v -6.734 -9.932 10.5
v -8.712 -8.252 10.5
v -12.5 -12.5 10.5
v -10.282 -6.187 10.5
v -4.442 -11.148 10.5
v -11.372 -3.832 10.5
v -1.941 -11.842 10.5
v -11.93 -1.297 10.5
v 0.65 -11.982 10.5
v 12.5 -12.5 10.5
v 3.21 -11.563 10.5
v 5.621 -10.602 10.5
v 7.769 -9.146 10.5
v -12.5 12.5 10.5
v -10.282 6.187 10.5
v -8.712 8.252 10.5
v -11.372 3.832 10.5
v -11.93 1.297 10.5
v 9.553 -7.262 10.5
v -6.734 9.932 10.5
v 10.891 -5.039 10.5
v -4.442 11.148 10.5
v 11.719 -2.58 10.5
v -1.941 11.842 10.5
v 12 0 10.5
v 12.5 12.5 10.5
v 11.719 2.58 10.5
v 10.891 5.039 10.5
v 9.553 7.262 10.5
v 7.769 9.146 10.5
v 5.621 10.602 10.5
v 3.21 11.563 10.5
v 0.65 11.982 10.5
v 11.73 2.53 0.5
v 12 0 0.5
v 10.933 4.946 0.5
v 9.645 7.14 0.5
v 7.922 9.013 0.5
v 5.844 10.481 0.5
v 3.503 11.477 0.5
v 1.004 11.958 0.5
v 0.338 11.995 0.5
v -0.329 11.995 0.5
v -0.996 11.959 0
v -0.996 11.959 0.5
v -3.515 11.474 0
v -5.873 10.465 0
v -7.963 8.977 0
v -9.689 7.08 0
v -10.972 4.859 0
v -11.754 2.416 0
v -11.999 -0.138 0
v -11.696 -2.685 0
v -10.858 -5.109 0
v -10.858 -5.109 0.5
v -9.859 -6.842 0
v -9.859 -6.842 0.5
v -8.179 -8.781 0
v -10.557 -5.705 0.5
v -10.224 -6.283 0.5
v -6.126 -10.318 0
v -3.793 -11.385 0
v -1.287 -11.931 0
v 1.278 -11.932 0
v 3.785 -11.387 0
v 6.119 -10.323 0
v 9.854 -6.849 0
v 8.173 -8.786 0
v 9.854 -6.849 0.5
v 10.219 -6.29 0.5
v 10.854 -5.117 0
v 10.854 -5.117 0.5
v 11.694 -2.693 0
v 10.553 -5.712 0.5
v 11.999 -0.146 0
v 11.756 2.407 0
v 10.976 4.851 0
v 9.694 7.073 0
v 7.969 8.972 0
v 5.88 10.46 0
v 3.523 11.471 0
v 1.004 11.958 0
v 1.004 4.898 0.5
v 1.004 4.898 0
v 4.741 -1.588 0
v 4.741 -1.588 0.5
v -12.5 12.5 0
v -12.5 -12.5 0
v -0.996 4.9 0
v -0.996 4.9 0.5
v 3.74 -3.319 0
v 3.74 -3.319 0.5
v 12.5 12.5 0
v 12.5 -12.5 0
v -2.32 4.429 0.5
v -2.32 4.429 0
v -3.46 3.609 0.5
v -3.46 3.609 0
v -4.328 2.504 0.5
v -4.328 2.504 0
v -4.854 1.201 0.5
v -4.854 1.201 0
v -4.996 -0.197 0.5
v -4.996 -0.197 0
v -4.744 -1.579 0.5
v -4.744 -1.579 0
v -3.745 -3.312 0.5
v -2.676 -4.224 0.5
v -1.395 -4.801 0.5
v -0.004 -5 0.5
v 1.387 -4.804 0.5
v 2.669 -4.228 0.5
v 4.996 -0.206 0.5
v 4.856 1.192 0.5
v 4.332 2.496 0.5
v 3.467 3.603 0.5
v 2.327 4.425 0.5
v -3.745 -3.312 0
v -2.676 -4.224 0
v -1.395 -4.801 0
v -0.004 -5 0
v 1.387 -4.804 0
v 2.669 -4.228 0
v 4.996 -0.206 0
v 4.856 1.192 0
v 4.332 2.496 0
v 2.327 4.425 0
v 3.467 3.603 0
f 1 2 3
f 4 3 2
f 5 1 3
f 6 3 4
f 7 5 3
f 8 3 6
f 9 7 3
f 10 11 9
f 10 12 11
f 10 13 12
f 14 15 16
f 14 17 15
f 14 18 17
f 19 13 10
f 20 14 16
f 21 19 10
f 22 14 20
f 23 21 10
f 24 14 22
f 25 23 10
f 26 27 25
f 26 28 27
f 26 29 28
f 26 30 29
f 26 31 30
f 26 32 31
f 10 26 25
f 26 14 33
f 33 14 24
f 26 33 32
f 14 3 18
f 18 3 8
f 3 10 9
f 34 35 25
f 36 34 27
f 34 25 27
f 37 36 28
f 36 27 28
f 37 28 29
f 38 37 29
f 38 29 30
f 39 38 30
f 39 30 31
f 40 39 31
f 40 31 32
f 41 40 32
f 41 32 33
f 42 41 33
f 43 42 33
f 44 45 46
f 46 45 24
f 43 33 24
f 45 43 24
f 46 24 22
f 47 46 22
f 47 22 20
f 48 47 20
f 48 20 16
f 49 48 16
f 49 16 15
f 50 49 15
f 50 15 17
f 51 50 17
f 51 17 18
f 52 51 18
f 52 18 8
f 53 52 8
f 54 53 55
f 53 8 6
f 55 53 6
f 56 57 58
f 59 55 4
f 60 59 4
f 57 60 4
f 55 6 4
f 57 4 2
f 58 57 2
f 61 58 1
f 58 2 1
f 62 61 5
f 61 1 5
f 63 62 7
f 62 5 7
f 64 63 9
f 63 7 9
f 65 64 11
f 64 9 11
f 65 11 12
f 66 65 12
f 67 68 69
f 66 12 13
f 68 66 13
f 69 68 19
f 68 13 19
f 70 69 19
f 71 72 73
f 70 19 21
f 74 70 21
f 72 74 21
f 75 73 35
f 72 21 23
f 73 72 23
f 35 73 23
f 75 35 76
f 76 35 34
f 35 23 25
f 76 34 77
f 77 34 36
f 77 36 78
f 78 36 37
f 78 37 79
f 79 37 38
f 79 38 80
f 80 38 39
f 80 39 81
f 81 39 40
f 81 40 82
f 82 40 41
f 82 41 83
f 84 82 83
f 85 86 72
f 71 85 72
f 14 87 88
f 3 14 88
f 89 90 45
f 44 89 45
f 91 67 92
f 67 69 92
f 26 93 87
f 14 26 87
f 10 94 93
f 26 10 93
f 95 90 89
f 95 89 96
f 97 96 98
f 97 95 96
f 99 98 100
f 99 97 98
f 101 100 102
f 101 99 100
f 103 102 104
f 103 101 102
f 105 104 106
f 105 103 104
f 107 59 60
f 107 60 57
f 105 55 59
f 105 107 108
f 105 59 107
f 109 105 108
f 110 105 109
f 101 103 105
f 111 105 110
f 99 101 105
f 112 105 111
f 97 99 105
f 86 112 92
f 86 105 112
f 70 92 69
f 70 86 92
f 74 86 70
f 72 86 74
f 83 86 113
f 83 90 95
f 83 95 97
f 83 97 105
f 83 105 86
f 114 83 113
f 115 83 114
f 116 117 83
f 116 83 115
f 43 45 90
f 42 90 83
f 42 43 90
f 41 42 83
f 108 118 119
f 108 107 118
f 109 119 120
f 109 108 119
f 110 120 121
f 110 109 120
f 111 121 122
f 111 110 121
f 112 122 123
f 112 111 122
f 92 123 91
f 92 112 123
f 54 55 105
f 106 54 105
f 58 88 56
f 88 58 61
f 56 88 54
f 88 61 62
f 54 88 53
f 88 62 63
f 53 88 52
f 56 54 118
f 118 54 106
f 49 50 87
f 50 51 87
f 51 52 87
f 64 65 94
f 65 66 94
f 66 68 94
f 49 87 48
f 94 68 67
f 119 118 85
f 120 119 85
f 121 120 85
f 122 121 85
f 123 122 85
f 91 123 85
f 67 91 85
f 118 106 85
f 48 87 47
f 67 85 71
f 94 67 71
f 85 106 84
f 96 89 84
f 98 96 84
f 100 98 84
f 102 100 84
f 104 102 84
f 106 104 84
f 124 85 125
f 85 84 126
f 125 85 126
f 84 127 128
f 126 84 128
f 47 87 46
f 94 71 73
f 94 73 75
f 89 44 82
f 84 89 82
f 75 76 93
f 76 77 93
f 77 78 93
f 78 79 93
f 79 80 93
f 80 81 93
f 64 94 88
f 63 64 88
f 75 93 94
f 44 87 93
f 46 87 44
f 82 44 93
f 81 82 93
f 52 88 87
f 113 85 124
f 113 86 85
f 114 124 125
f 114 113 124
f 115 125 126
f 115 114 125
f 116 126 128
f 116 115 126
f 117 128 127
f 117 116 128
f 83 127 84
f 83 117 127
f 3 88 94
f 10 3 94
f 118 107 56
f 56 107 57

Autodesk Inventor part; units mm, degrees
ref_plane "YZ Plane" through (0, 0, 0) normal (1, 0, 0) x (0, 1, 0)
ref_plane "XZ Plane" through (0, 0, 0) normal (0, 1, 0) x (-1, 0, 0)
ref_plane "XY Plane" through (0, 0, 0) normal (0, 0, 1) x (1, 0, 0)
sketch "스케치1" plane through (0, 0, 0) normal (0, 0, 1) x (1, 0, 0)
  line L0 (-12.5, -12.5) -> (12.5, -12.5)
  line L1 (12.5, -12.5) -> (12.5, 12.5)
  line L2 (12.5, 12.5) -> (-12.5, 12.5)
  line L3 (-12.5, 12.5) -> (-12.5, -12.5)
  line L4 (-12.5, -12.5) -> (12.5, 12.5) construction
  line L5 (12.5, -12.5) -> (-12.5, 12.5) construction
  point P0 (0, 0)
  dimension "d0" = 25
  dimension "d1" = 25
extrude "돌출1" add sketch "스케치1" along normal blind 10.5
sketch "스케치2" plane through (0, 0, 10.5) normal (0, 0, 1) x (1, 0, 0)
  circle A0 centre (0, 0) radius 12
  dimension "d5" = 24
extrude "돌출2" cut sketch "스케치2" against normal blind 10
sketch "스케치3" plane through (0, 0, 0.5) normal (0, 0, 1) x (1, 0, 0)
  circle A0 centre (0, 0) radius 5
  line L0 (-0.9958, 12.5064) -> (1.0042, 12.5064)
  line L1 (1.0042, 12.5064) -> (1.0042, 1.749)
  line L2 (1.0042, 1.749) -> (-0.9958, 1.749)
  line L3 (-0.9958, 1.749) -> (-0.9958, 12.5064)
  line L4 (-0.9958, 12.5064) -> (1.0042, 1.749) construction
  line L5 (1.0042, 12.5064) -> (-0.9958, 1.749) construction
  line L6 (-10.333, -7.1156) -> (-11.333, -5.3835)
  line L7 (-11.333, -5.3835) -> (-2.0168, -0.0048)
  line L8 (-2.0168, -0.0048) -> (-1.0168, -1.7369)
  line L9 (-1.0168, -1.7369) -> (-10.333, -7.1156)
  line L10 (-10.333, -7.1156) -> (-2.0168, -0.0048) construction
  line L11 (-11.333, -5.3835) -> (-1.0168, -1.7369) construction
  line L12 (11.3288, -5.3908) -> (10.3288, -7.1229)
  line L13 (10.3288, -7.1229) -> (1.0126, -1.7442)
  line L14 (1.0126, -1.7442) -> (2.0126, -0.0121)
  line L15 (2.0126, -0.0121) -> (11.3288, -5.3908)
  line L16 (11.3288, -5.3908) -> (1.0126, -1.7442) construction
  line L17 (10.3288, -7.1229) -> (2.0126, -0.0121) construction
  circle A1 centre (0, 0) radius 12 projected
  point P0 (0.0042, 7.1277)
  point P1 (-6.1749, -3.5602)
  point P2 (6.1707, -3.5675)
  point P3 (10.8544, -5.1169)
  point P4 (1.0042, 11.9579)
  point P5 (1.0042, 4.8981)
  point P6 (4.7413, -1.5875)
  point P7 (-9.8586, -6.8417)
  point P8 (9.8537, -6.8486)
  point P9 (3.7398, -3.3187)
  point P10 (-3.7455, -3.3123)
  point P11 (-0.9958, 11.9586)
  point P12 (-10.858, -5.1093)
  point P13 (-4.744, -1.5794)
  point P14 (-0.9958, 4.8998)
  dimension "d8" = 10
  dimension "d11" = 360
  dimension "d13" = 2
extrude "돌출3" cut sketch "스케치3" against normal blind 10 contours A0 L1 A1 L15 | A0 L7 A1 L3 | L13 A1 L9 A0
properties part number "쿨러"
